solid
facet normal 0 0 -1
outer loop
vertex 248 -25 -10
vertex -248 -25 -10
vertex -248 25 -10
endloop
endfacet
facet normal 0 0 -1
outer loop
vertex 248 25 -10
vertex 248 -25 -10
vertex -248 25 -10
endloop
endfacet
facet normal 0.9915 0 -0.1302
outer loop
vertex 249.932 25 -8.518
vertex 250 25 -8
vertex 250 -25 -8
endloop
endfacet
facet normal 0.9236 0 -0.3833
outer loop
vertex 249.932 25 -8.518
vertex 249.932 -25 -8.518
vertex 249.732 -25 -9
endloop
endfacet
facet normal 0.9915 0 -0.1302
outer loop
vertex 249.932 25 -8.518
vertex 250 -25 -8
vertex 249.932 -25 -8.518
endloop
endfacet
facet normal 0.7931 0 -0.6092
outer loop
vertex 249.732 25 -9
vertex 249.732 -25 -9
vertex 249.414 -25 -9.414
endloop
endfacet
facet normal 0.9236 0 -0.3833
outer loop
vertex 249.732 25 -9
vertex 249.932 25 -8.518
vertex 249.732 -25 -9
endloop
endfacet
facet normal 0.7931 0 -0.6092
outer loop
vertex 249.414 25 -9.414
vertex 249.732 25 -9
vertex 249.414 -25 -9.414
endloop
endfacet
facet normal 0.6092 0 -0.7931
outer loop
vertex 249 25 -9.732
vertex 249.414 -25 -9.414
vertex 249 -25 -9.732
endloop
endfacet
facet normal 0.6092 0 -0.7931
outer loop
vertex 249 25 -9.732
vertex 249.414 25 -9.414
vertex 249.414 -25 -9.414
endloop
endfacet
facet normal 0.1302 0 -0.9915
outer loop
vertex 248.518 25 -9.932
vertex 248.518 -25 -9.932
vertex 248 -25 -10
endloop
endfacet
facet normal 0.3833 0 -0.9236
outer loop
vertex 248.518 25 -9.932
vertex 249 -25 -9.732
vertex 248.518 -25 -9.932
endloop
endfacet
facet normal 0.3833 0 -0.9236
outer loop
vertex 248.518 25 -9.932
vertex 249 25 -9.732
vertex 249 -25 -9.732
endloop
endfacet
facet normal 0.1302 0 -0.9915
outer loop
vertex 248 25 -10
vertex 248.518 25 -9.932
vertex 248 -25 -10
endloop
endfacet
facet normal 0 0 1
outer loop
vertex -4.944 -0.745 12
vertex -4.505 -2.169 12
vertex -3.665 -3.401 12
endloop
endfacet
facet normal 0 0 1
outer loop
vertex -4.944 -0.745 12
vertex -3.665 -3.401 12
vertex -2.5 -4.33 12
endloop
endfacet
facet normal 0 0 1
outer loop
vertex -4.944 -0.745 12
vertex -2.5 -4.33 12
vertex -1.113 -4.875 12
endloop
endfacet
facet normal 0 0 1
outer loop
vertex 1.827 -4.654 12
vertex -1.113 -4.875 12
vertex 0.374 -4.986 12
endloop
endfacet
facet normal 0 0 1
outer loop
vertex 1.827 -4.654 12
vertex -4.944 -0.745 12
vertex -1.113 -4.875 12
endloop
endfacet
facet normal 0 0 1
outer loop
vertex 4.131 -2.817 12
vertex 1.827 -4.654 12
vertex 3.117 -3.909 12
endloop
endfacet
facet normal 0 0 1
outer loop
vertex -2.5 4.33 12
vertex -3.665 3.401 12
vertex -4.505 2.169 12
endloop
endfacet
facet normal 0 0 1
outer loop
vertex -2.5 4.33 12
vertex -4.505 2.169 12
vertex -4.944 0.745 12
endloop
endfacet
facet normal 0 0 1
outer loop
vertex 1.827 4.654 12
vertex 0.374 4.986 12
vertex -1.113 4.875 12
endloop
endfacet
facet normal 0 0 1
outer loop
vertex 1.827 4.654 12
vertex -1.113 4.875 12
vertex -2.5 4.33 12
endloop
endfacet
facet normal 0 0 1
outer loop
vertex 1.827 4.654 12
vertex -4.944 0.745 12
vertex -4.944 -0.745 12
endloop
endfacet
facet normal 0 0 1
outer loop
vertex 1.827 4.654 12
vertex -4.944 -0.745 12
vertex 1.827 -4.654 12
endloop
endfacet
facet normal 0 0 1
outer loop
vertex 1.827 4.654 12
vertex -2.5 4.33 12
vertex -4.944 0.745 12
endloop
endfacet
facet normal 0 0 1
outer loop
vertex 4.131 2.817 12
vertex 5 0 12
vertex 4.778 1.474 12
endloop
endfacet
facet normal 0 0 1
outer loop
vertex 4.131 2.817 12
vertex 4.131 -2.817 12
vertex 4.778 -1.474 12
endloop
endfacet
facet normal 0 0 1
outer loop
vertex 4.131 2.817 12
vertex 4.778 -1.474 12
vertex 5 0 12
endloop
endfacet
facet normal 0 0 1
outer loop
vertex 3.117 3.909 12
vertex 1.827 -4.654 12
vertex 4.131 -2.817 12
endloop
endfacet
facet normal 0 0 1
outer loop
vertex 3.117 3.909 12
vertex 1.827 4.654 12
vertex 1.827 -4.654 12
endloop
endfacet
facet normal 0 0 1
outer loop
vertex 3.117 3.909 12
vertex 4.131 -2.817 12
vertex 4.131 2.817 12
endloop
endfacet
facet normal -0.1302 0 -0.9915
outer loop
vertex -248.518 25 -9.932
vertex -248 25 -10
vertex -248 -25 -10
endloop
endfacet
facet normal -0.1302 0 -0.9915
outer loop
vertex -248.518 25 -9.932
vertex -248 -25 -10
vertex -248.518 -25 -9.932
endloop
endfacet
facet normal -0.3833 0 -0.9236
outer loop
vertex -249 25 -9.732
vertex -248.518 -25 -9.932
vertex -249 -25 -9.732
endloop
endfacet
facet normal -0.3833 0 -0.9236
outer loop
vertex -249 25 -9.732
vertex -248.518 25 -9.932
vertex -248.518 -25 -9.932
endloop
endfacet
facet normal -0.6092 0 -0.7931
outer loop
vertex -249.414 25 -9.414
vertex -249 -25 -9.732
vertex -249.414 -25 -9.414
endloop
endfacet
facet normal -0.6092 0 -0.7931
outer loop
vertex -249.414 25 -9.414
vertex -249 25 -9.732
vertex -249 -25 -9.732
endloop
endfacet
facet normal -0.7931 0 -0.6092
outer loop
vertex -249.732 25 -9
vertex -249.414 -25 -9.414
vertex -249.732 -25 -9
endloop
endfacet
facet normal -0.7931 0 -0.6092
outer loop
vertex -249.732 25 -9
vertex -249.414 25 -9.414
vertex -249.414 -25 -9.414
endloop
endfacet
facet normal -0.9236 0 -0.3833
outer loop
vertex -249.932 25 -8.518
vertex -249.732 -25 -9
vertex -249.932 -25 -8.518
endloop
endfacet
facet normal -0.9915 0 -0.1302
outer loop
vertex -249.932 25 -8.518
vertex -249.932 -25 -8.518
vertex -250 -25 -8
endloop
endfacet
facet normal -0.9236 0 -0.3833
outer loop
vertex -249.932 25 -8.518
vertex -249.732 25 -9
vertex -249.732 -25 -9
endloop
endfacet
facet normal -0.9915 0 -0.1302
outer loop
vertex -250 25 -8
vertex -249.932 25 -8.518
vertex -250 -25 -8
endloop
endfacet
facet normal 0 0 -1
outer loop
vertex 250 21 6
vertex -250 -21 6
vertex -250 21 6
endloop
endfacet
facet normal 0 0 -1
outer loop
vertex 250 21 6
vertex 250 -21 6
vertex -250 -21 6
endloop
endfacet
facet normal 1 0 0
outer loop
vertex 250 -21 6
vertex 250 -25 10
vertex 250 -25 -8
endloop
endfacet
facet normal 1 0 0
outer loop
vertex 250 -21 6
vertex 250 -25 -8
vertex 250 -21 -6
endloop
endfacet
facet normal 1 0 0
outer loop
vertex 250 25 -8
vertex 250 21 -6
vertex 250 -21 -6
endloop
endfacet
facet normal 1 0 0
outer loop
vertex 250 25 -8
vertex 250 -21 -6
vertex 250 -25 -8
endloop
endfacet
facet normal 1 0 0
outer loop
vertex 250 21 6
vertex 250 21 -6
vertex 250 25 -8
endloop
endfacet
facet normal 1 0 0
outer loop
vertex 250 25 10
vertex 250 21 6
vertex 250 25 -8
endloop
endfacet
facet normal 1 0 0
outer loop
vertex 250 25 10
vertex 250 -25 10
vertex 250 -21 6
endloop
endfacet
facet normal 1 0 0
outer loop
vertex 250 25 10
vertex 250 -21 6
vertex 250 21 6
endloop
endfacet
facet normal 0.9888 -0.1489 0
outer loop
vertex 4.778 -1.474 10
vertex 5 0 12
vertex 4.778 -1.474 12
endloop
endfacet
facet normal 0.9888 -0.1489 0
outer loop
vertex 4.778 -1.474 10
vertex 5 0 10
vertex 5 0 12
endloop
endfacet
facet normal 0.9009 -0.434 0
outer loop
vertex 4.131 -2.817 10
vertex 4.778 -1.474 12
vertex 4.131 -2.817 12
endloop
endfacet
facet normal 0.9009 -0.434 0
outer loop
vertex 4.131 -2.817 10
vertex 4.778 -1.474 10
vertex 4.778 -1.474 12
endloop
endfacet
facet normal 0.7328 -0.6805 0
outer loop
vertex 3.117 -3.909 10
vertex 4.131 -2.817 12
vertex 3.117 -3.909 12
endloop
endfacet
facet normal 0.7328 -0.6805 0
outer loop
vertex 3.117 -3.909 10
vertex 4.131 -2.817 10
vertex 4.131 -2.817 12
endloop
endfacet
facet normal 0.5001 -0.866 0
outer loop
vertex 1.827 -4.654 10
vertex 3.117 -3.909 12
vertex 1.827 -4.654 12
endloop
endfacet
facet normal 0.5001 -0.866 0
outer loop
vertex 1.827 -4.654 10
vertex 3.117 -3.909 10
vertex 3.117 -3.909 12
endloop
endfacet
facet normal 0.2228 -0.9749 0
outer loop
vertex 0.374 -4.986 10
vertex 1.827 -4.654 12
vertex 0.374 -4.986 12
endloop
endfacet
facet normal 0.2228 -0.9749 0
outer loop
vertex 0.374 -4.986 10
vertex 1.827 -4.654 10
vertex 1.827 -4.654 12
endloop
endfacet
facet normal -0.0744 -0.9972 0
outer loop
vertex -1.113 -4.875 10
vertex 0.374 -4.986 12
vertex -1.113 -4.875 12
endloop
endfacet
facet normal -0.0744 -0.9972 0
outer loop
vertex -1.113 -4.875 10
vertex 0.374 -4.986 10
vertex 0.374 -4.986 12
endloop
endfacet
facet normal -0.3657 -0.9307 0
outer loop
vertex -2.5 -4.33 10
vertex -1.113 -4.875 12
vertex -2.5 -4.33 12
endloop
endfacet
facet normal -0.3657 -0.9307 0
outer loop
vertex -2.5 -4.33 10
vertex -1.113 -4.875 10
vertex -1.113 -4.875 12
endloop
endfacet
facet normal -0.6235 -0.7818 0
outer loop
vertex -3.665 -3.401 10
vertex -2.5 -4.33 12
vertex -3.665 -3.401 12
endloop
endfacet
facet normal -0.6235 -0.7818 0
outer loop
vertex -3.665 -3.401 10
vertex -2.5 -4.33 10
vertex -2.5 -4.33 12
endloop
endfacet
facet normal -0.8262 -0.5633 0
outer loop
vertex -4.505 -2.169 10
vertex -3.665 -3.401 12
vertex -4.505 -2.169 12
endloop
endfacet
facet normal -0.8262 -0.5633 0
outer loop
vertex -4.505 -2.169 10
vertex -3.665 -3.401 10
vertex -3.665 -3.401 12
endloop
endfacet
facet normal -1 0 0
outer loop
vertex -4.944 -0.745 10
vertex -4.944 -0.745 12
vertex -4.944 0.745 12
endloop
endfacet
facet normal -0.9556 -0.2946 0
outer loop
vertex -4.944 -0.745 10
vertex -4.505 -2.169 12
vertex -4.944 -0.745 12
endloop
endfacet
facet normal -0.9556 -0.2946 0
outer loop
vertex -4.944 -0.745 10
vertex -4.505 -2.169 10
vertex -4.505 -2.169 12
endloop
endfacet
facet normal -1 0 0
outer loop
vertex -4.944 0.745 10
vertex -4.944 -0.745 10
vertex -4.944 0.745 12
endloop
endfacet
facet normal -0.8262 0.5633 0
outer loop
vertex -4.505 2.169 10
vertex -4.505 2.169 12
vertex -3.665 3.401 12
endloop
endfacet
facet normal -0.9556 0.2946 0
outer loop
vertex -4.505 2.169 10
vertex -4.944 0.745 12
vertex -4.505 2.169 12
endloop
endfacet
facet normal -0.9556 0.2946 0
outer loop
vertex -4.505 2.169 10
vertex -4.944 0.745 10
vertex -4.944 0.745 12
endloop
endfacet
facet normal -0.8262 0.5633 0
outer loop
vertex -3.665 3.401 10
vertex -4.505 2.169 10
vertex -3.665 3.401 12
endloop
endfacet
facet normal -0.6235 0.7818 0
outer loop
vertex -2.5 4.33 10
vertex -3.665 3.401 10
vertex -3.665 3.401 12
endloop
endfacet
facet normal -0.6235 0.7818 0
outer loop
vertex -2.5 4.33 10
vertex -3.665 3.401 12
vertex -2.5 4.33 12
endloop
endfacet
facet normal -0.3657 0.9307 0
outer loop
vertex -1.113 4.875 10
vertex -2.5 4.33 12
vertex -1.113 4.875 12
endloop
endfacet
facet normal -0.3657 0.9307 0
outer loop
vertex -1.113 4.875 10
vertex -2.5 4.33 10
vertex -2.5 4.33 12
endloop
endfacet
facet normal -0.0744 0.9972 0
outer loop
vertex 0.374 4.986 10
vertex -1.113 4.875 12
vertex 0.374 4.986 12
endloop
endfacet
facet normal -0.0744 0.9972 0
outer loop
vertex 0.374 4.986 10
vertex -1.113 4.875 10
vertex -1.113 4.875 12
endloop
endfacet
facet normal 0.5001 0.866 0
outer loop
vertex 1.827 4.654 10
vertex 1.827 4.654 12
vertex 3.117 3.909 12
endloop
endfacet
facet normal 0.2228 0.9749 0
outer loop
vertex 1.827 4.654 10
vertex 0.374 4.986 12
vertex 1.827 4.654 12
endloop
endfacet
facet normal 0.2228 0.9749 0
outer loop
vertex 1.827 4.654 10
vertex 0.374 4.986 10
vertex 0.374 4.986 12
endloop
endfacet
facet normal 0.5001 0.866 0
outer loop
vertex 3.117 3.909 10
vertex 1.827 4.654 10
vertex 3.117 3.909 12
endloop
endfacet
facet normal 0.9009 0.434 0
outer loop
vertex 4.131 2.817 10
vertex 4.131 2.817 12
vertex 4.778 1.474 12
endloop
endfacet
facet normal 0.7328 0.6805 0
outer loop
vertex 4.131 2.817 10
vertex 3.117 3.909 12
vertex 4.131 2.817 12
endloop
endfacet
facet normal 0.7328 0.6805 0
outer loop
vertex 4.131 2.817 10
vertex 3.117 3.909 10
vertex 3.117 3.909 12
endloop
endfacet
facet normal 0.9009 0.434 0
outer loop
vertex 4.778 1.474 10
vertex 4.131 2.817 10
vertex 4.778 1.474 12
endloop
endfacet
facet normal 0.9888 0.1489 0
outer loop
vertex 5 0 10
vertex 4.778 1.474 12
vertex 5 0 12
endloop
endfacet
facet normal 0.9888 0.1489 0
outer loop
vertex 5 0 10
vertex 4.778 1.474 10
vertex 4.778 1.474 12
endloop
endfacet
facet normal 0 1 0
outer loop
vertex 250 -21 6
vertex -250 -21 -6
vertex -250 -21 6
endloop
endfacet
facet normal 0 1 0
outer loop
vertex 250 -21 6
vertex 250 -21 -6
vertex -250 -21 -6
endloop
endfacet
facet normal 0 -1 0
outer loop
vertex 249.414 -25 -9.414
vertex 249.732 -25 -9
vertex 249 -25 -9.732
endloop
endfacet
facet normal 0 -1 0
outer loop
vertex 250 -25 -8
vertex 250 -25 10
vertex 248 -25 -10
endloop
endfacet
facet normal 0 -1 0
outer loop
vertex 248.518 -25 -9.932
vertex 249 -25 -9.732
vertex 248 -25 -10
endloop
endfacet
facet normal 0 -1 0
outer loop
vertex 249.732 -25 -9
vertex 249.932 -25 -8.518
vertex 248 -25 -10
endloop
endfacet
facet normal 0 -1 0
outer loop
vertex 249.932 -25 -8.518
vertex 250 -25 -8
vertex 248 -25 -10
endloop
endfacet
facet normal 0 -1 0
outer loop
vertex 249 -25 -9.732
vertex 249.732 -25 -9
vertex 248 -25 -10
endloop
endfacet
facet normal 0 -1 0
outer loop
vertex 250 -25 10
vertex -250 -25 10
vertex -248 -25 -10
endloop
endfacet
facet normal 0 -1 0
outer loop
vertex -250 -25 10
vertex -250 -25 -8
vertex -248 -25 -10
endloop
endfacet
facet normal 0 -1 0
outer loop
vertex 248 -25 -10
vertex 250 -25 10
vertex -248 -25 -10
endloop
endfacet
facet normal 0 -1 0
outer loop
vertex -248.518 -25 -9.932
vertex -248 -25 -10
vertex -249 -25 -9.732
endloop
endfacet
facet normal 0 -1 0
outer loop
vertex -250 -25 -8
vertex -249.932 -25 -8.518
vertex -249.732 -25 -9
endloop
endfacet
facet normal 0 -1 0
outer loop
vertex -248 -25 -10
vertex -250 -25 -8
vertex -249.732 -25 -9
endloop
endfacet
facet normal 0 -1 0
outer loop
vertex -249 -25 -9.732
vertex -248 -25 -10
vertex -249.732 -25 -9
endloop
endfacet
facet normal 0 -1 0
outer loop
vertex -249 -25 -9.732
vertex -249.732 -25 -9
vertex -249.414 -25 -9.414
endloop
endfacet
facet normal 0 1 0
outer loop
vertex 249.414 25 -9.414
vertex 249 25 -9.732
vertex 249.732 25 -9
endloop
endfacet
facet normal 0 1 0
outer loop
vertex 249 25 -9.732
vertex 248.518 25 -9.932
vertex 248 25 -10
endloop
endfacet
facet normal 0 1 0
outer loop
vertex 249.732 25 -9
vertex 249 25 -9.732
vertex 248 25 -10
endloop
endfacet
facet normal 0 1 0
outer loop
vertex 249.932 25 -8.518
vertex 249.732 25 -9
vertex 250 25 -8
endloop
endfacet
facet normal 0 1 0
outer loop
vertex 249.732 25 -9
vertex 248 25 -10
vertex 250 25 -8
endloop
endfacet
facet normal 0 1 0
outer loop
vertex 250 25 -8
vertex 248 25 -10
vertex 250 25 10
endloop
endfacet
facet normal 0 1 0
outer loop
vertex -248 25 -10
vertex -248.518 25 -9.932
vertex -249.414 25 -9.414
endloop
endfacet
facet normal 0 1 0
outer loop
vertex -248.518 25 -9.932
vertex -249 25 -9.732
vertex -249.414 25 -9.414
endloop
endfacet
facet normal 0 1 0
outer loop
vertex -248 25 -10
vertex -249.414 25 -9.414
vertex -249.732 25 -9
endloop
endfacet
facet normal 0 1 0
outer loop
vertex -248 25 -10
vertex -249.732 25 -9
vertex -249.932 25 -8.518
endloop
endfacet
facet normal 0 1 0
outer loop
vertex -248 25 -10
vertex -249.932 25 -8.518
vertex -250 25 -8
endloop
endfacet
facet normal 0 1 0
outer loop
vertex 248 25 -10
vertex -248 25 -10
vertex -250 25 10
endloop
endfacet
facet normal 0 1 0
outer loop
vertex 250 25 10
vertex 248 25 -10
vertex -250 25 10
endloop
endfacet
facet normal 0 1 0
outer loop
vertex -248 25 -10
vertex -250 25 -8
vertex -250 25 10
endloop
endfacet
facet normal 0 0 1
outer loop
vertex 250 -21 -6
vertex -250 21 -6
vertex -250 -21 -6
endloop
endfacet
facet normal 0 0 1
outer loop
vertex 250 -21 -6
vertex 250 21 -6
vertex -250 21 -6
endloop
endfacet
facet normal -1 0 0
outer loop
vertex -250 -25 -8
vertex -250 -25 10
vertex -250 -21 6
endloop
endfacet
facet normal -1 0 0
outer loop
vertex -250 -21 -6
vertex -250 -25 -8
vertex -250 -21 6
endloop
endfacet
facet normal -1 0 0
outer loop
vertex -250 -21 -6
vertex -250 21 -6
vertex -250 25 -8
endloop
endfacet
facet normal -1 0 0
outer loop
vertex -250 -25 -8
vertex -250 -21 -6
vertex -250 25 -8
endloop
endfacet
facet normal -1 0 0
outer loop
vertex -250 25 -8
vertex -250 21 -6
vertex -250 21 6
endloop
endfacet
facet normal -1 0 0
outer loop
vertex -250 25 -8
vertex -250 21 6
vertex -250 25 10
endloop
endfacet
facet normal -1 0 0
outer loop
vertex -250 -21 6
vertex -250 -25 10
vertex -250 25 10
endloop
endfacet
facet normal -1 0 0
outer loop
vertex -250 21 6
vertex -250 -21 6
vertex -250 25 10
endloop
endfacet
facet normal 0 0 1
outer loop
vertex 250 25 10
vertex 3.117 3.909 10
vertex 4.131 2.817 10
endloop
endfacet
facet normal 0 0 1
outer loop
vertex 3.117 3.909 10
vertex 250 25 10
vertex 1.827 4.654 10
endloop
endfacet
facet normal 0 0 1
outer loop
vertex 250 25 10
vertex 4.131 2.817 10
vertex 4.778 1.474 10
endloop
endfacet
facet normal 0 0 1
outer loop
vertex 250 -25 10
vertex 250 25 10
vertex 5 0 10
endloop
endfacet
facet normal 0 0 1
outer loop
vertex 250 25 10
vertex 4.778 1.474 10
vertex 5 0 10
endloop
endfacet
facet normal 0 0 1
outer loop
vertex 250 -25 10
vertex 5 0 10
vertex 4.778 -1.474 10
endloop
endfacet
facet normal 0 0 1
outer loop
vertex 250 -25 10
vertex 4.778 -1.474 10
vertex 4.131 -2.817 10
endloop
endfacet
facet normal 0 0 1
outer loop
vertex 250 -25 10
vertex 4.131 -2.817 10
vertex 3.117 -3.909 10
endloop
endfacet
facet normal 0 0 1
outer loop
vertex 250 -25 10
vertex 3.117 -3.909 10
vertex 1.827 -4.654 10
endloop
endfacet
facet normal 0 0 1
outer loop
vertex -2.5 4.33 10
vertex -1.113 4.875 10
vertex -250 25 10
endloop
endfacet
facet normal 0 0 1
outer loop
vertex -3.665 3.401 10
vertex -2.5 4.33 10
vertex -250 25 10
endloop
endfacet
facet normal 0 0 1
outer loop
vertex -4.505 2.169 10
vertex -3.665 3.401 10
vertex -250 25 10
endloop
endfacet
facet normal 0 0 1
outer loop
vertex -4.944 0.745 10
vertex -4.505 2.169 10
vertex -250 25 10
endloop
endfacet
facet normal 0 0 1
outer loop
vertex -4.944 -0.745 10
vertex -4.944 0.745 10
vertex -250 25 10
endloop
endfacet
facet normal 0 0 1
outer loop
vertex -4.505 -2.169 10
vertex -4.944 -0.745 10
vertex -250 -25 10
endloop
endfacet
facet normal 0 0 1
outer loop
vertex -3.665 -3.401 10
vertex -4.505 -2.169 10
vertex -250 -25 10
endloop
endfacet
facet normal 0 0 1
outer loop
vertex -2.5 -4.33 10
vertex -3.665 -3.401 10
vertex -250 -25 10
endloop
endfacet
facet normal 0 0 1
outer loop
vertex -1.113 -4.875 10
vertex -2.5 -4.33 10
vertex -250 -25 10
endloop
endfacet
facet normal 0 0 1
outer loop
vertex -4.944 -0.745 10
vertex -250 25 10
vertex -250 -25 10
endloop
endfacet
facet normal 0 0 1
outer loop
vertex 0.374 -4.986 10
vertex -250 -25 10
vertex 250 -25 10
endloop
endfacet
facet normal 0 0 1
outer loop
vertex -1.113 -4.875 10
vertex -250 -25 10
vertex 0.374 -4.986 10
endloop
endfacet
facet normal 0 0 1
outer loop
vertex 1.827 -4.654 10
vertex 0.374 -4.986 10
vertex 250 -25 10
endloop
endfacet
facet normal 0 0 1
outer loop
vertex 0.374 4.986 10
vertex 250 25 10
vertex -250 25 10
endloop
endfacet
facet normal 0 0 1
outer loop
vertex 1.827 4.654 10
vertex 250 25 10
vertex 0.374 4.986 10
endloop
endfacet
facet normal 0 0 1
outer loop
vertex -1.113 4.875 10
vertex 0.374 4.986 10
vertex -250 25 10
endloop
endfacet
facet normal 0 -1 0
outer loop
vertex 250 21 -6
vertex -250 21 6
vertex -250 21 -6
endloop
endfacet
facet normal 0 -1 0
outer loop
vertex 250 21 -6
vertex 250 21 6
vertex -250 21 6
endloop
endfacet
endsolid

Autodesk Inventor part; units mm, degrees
ref_plane "YZ Plane" through (0, 0, 0) normal (1, 0, 0) x (0, 1, 0)
ref_plane "XZ Plane" through (0, 0, 0) normal (0, 1, 0) x (-1, 0, 0)
ref_plane "XY Plane" through (0, 0, 0) normal (0, 0, 1) x (1, 0, 0)
sketch "スケッチ2" plane through (0, 0, 0) normal (1, 0, 0) x (0, 1, 0)
  line L0 (25, 10) -> (-25, 10)
  line L1 (-25, 10) -> (-25, -10)
  line L2 (-25, -10) -> (25, -10)
  line L3 (25, -10) -> (25, 10)
  line L4 (25, 10) -> (-25, -10) construction
  line L5 (-25, 10) -> (25, -10) construction
  point P0 (0, 0)
  dimension "d4" = 50
  dimension "d5" = 20
extrude "押し出し2" add sketch "スケッチ2" along normal mid plane 500
sketch "スケッチ3" plane through (-250, -25, 10) normal (0, 0, 1) x (1, 0, 0)
  circle A0 centre (250, 25) radius 5
  dimension "d8" = 10
extrude "押し出し3" add sketch "スケッチ3" along normal blind 2
fillet "フィレット1" radius 2 2 edges at (250, 0, -10) (-250, 0, -10)
sketch "スケッチ4" plane through (250, 0, 0) normal (1, 0, 0) x (0, 0, -1)
  line L0 (-6, 21) -> (6, 21)
  line L1 (6, 21) -> (6, -21)
  line L2 (6, -21) -> (-6, -21)
  line L3 (-6, -21) -> (-6, 21)
  line L4 (-6, 21) -> (6, -21) construction
  line L5 (6, 21) -> (-6, -21) construction
  point P0 (0, 0)
  dimension "d12" = 12
  dimension "d13" = 42
extrude "押し出し4" cut sketch "スケッチ4" against normal through all
properties part number "hashi1shado"
